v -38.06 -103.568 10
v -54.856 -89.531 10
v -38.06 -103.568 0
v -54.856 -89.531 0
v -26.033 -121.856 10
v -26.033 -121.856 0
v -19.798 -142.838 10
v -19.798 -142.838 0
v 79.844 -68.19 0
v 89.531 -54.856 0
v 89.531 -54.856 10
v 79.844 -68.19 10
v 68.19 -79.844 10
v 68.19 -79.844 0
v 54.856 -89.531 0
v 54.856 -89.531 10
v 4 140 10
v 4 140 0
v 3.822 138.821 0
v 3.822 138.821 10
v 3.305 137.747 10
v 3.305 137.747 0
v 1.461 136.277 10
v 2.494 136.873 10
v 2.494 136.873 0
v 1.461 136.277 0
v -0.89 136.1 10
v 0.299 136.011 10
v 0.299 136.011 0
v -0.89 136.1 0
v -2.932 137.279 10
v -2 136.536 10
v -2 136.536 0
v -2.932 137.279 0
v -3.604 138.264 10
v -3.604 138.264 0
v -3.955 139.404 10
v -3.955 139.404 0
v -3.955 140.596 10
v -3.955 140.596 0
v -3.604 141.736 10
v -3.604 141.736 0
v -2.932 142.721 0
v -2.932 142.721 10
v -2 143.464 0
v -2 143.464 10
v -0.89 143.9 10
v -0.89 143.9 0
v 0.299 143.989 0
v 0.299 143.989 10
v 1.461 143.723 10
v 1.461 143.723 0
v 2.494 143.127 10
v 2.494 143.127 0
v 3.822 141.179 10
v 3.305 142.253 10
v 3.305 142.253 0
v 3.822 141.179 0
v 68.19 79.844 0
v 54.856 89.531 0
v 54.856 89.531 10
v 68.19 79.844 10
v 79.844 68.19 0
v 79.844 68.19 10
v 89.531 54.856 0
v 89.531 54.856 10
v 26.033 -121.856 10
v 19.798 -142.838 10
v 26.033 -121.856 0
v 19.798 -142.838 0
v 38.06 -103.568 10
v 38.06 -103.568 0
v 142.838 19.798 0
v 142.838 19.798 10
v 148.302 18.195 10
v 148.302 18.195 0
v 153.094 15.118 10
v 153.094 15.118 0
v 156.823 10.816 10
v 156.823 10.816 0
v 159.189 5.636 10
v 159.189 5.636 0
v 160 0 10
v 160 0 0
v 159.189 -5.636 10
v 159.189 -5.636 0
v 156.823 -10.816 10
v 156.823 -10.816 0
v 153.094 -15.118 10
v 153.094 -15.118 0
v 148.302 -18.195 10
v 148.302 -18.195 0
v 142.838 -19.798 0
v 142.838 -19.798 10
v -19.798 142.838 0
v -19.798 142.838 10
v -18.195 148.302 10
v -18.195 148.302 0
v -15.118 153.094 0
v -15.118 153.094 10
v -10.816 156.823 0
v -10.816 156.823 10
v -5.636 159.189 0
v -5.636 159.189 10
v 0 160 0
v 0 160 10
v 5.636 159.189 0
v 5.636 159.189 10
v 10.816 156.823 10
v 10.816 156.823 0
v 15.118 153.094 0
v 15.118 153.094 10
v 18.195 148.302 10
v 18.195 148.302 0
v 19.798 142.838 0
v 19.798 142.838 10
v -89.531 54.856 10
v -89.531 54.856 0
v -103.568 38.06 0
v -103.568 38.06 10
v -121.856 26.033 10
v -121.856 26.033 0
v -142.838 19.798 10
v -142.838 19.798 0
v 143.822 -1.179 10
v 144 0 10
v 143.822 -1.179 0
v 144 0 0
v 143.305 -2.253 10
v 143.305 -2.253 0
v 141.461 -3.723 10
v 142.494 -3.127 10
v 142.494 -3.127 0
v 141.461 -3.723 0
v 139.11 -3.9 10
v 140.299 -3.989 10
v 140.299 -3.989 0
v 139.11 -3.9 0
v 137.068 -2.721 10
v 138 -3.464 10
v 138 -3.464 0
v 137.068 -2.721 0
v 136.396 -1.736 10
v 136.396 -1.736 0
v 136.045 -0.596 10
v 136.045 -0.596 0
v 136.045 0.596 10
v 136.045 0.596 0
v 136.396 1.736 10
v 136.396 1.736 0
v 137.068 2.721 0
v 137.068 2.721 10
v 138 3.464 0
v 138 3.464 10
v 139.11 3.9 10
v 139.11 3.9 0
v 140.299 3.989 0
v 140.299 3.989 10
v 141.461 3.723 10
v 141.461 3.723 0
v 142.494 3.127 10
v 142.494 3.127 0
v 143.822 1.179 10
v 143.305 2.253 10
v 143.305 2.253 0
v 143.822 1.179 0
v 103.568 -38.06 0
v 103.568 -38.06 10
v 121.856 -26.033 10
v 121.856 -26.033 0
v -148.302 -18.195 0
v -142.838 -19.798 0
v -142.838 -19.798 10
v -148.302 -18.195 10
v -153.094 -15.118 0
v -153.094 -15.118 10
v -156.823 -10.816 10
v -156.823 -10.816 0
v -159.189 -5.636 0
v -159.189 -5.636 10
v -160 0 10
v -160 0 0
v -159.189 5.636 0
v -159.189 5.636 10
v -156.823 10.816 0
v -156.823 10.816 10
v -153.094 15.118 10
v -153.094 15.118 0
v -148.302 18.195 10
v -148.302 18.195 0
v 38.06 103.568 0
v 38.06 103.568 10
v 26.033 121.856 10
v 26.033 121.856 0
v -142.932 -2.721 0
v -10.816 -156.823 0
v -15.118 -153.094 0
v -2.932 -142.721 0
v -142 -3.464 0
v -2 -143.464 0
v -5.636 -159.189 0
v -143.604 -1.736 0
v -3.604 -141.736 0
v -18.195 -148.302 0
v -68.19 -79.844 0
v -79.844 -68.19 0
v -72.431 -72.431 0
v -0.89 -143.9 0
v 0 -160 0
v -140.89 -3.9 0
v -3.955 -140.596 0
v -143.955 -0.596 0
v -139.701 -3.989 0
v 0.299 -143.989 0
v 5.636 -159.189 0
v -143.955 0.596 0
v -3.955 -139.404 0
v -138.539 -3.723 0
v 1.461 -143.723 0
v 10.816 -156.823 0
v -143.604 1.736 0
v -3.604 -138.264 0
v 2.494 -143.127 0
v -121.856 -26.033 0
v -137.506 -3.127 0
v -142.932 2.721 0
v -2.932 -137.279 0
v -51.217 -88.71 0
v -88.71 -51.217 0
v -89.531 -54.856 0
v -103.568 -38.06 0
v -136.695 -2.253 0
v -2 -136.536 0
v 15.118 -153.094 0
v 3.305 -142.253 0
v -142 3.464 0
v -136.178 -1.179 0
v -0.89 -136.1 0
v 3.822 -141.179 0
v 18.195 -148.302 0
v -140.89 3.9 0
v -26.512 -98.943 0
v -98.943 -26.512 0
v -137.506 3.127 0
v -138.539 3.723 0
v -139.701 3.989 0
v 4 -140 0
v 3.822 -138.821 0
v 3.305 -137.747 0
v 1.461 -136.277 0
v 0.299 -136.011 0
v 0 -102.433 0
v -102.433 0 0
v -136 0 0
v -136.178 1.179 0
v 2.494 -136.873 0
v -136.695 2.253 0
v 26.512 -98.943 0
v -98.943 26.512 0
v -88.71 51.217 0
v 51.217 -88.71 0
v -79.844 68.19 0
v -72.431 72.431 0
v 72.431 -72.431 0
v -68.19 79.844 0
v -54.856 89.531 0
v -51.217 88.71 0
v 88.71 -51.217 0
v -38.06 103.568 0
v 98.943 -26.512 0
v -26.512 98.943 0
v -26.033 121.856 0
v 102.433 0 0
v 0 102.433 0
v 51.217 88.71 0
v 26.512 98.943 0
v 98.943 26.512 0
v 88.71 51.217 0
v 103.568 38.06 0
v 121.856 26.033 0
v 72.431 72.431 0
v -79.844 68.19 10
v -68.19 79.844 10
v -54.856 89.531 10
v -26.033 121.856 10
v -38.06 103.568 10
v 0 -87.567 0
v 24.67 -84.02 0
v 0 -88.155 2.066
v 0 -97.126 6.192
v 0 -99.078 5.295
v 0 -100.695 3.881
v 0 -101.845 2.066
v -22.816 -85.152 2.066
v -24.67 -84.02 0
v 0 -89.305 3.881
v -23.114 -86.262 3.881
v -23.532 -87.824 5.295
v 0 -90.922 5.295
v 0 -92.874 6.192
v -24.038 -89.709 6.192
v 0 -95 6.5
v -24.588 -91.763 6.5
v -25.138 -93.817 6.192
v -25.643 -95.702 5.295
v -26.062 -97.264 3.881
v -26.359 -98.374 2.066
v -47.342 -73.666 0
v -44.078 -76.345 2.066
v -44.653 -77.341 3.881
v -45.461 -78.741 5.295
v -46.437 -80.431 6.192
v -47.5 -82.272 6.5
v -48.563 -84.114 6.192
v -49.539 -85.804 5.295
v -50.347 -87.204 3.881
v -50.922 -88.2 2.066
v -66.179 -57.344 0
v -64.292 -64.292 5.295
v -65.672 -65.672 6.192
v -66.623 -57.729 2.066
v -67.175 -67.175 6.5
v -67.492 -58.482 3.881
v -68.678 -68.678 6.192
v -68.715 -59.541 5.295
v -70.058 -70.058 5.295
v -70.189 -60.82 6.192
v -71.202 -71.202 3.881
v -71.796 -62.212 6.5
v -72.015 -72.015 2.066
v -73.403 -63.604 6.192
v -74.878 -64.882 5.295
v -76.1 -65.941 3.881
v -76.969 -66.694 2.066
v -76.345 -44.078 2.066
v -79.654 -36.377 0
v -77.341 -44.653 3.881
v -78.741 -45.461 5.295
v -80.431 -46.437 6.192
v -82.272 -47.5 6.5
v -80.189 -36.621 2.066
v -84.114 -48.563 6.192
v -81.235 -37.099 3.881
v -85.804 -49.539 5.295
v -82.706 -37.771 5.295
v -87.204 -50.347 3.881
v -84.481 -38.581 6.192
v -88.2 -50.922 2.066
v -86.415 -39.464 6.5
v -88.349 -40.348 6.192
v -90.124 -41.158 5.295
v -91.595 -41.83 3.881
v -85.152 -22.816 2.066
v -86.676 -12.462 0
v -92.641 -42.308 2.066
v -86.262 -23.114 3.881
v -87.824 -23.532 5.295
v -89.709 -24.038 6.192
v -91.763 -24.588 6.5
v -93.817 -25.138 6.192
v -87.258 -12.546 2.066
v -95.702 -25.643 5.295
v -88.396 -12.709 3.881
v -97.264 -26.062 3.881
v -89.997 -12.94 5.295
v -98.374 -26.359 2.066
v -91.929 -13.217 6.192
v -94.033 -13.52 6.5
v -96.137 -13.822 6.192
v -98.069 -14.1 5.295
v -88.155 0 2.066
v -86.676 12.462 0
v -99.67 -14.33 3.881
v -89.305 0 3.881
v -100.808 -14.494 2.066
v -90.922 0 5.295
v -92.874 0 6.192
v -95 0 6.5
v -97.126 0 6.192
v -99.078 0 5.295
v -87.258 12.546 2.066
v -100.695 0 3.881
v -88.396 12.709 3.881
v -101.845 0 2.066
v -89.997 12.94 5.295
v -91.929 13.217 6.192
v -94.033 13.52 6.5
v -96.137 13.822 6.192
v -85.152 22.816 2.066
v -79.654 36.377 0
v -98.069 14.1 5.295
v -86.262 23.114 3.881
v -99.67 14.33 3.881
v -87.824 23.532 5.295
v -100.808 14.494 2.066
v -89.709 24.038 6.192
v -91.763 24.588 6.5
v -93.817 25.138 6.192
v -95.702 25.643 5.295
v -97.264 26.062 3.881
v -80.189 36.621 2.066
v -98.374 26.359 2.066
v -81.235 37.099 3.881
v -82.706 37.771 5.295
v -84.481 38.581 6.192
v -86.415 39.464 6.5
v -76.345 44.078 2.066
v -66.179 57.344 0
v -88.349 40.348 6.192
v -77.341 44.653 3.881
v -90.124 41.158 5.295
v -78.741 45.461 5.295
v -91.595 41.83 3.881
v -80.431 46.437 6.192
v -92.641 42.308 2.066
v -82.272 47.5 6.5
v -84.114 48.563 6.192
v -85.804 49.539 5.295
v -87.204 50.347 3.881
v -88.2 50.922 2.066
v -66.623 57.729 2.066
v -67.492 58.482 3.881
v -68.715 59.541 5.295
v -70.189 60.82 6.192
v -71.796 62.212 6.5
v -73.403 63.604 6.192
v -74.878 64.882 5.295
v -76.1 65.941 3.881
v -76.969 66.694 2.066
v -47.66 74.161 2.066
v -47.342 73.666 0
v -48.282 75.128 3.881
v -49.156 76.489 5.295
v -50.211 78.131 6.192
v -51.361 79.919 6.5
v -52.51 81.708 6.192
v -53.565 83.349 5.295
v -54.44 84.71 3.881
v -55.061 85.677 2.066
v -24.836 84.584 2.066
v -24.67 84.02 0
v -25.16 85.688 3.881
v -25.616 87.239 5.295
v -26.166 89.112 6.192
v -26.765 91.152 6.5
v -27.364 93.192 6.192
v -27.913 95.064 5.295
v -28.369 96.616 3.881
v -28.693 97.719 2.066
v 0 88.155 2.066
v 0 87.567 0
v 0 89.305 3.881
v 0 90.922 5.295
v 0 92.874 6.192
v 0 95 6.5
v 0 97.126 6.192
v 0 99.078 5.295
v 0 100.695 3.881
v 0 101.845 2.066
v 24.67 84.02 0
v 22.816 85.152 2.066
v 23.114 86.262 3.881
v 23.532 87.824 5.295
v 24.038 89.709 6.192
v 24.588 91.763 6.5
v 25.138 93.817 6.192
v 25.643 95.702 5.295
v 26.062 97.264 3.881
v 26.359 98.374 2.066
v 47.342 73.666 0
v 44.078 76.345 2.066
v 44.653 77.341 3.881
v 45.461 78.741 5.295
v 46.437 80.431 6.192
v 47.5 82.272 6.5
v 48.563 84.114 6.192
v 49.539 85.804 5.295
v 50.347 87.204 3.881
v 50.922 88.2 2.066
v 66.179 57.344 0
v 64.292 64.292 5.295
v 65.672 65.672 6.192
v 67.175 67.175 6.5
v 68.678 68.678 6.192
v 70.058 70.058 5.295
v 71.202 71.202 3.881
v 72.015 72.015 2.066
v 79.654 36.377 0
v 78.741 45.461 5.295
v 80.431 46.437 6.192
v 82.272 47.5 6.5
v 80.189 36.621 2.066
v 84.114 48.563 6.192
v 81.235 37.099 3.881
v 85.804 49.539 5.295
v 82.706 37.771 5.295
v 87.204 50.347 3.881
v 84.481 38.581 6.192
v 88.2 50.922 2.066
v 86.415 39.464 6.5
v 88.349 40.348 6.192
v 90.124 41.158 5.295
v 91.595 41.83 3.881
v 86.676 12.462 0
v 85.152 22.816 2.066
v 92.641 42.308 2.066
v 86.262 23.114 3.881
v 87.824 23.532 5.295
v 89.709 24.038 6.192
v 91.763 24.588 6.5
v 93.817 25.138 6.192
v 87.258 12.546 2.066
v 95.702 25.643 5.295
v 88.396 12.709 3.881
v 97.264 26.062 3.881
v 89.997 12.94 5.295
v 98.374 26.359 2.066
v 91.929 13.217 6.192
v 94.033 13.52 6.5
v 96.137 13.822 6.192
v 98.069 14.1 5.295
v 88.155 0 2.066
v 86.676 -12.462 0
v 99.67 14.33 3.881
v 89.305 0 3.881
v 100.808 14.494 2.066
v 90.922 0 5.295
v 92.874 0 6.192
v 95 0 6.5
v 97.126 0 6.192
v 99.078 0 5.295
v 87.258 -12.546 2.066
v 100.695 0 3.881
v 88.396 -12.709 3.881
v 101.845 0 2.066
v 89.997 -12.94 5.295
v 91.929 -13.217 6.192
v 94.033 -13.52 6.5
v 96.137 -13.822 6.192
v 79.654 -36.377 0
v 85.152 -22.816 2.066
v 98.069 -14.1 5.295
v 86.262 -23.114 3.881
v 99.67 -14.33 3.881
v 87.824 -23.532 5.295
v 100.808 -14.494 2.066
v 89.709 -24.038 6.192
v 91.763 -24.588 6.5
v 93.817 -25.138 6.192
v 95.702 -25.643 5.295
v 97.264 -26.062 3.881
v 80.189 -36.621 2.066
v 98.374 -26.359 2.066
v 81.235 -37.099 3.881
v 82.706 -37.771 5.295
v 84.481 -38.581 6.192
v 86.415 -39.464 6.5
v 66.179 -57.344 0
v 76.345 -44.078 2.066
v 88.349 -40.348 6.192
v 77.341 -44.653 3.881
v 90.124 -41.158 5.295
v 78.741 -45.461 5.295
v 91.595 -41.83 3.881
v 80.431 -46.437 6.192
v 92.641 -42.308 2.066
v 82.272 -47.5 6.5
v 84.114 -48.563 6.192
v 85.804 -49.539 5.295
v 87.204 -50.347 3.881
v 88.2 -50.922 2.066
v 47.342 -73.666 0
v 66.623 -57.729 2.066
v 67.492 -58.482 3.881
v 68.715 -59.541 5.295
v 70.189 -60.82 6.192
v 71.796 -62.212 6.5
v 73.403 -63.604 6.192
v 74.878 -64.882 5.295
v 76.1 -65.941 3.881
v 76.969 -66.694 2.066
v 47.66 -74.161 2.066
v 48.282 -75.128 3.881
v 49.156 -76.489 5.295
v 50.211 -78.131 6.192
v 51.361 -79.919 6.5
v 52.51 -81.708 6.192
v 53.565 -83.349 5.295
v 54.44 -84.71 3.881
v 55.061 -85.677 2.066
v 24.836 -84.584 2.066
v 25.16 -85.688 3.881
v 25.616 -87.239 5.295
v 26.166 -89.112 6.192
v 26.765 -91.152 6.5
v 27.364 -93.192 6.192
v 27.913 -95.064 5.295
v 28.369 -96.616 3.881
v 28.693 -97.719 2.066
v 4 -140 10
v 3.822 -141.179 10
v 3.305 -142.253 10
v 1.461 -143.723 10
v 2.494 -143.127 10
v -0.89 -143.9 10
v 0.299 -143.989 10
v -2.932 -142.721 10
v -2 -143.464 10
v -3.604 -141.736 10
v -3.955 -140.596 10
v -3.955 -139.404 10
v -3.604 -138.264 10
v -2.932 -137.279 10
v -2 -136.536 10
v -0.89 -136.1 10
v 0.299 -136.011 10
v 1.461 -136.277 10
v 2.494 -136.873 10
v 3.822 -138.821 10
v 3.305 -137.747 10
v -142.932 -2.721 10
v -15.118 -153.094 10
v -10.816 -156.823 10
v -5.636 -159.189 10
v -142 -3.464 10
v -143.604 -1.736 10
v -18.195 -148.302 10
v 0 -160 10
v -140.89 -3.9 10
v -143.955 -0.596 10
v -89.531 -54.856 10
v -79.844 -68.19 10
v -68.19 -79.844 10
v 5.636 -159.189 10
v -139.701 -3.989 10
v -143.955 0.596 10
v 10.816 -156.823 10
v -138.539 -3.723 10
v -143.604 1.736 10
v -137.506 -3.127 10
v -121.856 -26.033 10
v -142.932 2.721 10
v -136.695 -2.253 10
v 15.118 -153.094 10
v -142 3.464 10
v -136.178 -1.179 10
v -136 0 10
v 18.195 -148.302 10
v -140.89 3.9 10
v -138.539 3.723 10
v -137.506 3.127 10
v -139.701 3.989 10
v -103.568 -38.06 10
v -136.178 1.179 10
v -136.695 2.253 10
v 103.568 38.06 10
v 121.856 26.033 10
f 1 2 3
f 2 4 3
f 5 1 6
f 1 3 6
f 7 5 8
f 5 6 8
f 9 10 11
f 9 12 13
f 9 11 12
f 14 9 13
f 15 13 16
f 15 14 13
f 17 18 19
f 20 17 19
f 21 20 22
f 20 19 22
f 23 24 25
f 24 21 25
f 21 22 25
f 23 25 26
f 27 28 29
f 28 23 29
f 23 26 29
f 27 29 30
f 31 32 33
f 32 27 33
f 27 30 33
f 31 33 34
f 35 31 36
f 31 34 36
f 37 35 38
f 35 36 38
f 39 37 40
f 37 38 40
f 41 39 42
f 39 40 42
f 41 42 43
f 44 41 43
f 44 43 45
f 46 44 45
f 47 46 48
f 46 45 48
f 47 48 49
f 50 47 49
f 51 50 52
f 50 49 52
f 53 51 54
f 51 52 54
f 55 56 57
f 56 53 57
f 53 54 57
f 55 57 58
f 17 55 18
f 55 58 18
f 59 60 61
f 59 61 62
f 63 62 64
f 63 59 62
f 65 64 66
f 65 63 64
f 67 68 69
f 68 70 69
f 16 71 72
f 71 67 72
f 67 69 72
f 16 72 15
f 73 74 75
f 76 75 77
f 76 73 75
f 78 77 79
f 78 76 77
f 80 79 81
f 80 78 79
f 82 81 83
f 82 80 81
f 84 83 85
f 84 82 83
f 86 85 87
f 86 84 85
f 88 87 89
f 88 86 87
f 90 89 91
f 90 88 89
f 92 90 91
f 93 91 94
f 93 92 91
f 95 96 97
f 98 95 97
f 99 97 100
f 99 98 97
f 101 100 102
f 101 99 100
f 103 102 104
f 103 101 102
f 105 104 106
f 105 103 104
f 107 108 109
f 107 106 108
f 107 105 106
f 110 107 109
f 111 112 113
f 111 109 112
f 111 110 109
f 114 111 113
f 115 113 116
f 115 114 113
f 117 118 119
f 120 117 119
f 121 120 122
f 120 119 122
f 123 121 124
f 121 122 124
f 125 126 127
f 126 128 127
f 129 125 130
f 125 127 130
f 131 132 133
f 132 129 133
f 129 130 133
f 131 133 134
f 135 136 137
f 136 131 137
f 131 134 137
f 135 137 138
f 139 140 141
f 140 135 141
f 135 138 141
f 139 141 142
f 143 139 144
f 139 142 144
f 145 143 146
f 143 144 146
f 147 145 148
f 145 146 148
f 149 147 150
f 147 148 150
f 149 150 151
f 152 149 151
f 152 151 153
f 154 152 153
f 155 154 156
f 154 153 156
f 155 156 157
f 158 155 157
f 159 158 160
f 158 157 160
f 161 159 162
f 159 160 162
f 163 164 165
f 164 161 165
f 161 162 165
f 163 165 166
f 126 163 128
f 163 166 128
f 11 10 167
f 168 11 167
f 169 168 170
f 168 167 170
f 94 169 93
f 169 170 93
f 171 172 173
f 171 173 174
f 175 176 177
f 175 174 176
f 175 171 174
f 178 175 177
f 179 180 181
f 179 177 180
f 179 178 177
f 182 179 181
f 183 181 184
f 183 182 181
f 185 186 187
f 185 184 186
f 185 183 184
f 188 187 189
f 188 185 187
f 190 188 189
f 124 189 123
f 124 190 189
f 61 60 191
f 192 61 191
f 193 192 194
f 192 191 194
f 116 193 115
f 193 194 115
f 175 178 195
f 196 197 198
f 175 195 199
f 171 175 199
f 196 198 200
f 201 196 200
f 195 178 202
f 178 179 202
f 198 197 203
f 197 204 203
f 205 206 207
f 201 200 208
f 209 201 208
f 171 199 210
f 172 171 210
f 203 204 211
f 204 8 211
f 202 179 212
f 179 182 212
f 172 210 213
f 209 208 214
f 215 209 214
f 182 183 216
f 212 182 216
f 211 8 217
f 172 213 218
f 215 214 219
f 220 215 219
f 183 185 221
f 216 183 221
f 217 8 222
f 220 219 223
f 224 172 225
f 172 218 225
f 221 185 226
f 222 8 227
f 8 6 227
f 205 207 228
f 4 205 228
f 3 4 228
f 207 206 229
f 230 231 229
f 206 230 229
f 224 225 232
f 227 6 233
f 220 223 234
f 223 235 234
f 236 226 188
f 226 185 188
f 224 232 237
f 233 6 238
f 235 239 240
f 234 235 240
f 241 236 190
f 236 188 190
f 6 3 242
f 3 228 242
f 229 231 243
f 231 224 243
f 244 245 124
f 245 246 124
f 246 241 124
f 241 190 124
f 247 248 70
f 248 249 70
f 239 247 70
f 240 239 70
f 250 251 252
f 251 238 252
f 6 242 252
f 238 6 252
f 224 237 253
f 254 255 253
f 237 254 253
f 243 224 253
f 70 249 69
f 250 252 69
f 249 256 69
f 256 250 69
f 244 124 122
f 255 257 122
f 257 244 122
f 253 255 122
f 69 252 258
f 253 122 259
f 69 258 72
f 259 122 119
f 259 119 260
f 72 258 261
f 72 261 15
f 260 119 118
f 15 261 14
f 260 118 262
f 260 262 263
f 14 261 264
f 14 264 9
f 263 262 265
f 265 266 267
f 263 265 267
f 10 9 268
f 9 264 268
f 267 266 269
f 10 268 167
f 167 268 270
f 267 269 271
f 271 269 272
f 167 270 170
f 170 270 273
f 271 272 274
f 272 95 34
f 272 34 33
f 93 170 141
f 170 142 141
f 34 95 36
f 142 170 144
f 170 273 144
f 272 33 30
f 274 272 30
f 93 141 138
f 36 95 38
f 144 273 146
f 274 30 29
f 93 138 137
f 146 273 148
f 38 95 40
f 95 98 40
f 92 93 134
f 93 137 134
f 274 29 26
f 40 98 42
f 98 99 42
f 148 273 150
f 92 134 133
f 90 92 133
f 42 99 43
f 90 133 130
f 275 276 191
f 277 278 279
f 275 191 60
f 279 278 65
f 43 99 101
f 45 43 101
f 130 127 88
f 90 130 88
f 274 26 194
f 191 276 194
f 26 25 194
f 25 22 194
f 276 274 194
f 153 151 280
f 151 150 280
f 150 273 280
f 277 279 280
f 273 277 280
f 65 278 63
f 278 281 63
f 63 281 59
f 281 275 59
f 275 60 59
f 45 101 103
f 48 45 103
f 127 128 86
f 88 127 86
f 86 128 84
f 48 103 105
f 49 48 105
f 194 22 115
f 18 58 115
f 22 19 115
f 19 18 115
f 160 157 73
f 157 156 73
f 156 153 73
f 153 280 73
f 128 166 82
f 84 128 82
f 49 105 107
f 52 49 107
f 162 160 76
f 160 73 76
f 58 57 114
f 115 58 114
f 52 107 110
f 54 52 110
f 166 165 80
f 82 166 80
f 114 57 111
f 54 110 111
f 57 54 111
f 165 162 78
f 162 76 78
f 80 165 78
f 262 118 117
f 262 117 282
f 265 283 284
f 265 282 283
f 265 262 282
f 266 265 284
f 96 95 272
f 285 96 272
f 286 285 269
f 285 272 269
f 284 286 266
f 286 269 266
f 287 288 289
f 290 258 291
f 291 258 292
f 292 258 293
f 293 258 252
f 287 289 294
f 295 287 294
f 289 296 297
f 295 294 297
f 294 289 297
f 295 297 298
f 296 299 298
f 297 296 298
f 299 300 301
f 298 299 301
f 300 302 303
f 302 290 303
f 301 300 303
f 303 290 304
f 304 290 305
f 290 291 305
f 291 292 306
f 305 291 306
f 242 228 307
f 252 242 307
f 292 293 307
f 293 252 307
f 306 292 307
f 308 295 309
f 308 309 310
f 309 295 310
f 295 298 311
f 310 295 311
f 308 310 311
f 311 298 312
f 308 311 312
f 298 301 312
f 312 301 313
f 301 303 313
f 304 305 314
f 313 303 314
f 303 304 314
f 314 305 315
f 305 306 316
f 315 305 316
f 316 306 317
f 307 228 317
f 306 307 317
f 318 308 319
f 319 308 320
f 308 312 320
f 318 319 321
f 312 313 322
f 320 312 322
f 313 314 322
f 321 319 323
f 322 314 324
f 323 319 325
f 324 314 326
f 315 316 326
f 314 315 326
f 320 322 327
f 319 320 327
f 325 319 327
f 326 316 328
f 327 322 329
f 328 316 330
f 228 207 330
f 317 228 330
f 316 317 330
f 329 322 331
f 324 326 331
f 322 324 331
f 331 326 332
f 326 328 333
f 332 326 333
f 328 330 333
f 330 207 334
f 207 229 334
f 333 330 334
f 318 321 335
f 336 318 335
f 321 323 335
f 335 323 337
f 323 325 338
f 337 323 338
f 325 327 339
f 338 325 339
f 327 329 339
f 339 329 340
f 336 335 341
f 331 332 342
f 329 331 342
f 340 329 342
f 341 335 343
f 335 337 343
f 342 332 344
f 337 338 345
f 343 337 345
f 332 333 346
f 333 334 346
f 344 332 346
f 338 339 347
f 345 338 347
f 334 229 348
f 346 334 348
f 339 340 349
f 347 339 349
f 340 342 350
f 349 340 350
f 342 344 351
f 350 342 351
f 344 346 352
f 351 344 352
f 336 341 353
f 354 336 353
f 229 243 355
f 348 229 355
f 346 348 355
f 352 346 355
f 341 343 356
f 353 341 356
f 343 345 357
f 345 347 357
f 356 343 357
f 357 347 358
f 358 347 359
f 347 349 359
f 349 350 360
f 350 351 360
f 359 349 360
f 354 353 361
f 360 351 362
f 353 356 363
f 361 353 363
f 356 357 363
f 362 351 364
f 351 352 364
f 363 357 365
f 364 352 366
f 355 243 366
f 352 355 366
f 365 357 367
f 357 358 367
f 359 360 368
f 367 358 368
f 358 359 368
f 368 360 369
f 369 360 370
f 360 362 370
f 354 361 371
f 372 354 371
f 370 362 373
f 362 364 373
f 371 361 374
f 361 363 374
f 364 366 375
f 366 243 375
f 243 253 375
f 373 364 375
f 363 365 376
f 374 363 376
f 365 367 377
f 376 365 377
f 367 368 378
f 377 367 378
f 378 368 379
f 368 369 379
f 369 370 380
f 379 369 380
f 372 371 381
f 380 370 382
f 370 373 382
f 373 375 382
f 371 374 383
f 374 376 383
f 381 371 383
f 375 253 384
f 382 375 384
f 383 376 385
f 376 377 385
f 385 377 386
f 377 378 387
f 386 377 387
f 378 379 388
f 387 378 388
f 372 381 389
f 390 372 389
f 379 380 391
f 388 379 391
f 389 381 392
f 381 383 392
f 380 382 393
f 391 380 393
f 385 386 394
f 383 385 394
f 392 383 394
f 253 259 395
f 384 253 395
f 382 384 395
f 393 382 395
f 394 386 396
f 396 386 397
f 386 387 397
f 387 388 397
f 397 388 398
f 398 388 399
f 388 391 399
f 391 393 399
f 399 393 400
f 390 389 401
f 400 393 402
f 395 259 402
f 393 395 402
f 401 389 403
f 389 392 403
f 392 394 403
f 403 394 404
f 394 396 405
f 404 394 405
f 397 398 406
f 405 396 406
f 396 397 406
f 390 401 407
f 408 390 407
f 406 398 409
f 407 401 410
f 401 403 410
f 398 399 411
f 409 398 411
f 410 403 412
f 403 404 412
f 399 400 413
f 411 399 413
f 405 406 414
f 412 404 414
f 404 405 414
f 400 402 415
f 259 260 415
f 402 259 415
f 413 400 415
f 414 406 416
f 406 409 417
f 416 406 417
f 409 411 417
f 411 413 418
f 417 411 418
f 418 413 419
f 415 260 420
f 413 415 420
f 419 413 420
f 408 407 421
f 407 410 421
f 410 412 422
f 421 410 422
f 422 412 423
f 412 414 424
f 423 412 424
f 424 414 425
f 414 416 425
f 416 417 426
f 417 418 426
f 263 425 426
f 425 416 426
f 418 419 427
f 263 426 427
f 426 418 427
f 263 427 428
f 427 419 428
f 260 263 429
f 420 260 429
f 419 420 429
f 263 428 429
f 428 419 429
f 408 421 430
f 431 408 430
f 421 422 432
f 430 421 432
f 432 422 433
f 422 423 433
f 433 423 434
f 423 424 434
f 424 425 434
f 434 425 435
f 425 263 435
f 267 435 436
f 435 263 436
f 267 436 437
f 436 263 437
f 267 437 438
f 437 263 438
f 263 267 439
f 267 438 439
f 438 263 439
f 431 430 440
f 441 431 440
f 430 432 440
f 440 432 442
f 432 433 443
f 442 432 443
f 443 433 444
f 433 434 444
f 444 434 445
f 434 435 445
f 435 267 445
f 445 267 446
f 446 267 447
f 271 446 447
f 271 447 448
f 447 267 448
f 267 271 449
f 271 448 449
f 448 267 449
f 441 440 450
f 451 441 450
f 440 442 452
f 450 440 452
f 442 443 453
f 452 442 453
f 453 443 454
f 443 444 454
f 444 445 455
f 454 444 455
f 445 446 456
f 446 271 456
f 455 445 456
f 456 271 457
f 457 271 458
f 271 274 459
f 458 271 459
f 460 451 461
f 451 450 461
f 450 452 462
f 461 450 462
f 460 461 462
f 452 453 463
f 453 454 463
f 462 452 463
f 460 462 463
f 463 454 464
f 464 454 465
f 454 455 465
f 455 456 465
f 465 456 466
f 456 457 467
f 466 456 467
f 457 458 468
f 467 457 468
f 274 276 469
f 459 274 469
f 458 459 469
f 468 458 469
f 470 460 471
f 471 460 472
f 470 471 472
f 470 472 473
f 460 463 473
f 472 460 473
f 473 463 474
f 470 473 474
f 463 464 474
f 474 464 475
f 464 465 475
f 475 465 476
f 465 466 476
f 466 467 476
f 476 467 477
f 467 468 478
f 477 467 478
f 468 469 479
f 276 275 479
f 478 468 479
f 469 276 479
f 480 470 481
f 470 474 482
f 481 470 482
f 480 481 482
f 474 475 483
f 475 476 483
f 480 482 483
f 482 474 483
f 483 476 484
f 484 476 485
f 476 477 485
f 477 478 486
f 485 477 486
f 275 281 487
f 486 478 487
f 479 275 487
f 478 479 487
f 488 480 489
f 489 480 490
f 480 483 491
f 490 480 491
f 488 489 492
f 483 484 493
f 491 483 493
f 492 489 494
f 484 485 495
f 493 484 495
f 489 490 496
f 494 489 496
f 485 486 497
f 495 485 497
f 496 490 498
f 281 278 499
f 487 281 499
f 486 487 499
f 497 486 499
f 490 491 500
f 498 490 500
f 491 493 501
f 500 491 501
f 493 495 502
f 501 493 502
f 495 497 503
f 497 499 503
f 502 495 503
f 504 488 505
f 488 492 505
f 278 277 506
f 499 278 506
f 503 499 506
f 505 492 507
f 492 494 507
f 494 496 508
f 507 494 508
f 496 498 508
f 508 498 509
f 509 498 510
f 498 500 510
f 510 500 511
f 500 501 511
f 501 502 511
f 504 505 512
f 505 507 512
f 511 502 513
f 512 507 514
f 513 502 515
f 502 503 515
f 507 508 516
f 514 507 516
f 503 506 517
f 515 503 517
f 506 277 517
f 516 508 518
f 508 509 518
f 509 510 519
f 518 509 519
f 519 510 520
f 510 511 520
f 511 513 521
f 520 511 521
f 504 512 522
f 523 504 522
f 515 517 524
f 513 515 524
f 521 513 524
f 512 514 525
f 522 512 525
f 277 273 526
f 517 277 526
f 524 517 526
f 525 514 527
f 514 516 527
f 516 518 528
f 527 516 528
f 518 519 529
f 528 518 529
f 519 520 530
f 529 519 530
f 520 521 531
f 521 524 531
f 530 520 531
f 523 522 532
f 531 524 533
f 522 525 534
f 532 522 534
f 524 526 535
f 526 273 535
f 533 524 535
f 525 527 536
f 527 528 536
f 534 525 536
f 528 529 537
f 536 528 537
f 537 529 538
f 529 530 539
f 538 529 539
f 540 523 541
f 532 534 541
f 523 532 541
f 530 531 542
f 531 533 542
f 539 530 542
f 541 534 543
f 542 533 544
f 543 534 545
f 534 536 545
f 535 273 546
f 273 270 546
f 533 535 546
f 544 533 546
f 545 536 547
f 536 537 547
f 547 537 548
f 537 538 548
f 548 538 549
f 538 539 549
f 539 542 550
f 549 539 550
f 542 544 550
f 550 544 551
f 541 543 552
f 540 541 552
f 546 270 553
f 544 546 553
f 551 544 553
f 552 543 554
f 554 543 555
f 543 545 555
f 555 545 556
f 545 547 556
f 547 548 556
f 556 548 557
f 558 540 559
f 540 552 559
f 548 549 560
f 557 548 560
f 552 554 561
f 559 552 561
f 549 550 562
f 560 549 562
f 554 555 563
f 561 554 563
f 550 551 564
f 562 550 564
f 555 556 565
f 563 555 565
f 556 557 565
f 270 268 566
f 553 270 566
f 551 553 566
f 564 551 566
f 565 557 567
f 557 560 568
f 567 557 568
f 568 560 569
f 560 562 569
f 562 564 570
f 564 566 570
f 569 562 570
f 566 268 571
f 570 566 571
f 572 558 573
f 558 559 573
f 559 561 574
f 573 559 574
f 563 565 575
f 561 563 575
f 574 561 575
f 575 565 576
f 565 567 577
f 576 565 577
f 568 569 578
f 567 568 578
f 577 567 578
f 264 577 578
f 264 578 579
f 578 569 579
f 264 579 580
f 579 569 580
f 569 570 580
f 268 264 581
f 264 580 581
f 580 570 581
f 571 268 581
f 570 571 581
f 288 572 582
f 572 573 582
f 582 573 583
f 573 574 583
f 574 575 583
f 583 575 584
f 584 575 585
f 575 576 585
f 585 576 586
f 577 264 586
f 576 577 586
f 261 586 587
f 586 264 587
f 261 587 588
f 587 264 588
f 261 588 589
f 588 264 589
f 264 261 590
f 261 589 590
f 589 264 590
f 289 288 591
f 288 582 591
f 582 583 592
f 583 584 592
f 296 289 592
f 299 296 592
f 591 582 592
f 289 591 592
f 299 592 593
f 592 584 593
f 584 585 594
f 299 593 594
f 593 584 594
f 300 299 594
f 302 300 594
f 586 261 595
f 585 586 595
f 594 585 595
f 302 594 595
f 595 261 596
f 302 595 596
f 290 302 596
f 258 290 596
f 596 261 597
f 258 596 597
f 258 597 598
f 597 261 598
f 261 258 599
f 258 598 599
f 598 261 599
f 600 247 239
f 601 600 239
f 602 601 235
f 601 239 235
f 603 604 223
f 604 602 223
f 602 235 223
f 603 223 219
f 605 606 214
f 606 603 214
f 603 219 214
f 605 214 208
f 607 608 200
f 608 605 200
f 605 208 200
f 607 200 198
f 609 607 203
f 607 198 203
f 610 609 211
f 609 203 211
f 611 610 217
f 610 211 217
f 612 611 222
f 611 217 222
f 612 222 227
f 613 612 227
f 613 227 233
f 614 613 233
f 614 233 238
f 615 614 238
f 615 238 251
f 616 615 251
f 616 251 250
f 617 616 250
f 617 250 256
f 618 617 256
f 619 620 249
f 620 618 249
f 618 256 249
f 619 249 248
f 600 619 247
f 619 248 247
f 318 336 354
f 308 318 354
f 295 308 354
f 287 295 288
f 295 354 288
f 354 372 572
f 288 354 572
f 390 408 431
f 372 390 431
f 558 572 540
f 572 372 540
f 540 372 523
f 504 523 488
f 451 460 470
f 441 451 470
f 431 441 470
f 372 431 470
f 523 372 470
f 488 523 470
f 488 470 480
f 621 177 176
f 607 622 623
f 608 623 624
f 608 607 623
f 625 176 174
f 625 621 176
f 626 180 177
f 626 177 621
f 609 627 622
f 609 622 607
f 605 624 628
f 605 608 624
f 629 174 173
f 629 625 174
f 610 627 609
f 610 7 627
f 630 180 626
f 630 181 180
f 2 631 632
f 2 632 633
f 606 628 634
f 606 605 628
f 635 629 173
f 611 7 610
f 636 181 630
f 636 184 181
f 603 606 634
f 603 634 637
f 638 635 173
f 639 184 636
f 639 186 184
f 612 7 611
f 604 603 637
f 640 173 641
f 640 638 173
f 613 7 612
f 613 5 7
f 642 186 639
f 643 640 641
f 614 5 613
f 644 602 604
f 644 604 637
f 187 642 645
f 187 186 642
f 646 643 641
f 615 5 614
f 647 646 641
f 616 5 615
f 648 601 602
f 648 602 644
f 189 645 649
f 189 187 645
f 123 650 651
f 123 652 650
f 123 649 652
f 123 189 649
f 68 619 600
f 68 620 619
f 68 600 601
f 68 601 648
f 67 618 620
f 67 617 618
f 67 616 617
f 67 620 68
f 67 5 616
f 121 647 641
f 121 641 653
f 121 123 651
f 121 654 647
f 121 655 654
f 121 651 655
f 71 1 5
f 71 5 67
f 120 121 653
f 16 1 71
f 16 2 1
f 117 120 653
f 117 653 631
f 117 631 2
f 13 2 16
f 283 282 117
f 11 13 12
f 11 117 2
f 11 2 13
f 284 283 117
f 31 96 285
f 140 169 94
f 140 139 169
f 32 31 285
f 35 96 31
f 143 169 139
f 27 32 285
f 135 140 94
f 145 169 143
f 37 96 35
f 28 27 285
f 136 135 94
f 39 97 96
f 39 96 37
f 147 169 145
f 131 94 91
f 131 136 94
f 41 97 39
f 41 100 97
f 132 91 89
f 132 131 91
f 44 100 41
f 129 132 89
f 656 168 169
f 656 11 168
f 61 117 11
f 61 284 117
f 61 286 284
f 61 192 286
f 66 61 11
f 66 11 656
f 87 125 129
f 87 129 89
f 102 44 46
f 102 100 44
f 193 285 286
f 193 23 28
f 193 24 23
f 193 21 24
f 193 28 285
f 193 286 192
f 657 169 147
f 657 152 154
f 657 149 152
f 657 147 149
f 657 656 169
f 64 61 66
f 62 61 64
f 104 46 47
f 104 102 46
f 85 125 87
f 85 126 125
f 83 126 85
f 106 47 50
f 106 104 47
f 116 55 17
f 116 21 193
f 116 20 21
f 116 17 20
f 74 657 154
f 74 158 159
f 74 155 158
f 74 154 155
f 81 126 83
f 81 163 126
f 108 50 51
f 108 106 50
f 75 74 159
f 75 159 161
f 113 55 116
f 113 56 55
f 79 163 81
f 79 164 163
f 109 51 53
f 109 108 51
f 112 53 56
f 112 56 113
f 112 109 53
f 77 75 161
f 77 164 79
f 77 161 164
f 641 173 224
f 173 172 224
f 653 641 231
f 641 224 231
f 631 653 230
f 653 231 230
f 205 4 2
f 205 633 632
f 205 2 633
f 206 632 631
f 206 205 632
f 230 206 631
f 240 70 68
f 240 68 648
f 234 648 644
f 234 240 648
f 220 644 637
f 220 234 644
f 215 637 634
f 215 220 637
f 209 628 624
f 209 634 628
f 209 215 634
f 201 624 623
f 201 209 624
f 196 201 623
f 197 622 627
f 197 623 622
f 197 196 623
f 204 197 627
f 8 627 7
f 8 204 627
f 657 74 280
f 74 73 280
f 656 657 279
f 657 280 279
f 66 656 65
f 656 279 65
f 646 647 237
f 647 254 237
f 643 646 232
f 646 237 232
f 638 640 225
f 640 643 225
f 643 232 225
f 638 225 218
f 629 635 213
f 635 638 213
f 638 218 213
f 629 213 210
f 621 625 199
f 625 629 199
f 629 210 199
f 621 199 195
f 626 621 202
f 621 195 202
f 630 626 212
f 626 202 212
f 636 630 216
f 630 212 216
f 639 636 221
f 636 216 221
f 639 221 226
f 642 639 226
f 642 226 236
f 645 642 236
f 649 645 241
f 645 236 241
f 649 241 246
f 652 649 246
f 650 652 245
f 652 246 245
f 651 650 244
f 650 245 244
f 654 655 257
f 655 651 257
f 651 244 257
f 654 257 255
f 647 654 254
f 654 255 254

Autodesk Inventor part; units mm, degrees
ref_plane "YZ Plane" through (0, 0, 0) normal (1, 0, 0) x (0, 1, 0)
ref_plane "XZ Plane" through (0, 0, 0) normal (0, 1, 0) x (-1, 0, 0)
ref_plane "XY Plane" through (0, 0, 0) normal (0, 0, 1) x (1, 0, 0)
sketch "Sketch1" plane through (0, 0, 0) normal (0, 0, 1) x (1, 0, 0)
  circle A0 centre (0, 0) radius 105
  circle A1 centre (140, 0) radius 4
  circle A2 centre (140, 0) radius 20
  arc A3 (89.5312, 54.8558) -> (142.8383, 19.7976) centre (153.4821, 94.0385) ccw
  arc A4 (142.8383, -19.7976) -> (89.5312, -54.8558) centre (153.4821, -94.0385) ccw
  circle A5 centre (0, 140) radius 4
  circle A6 centre (0, 140) radius 20
  arc A7 (19.7976, 142.8383) -> (54.8558, 89.5312) centre (94.0385, 153.4821) ccw
  arc A8 (-54.8558, 89.5312) -> (-19.7976, 142.8383) centre (-94.0385, 153.4821) ccw
  circle A9 centre (-140, 0) radius 4
  circle A10 centre (-140, 0) radius 20
  arc A11 (-142.8383, 19.7976) -> (-89.5312, 54.8558) centre (-153.4821, 94.0385) ccw
  arc A12 (-89.5312, -54.8558) -> (-142.8383, -19.7976) centre (-153.4821, -94.0385) ccw
  circle A13 centre (0, -140) radius 4
  circle A14 centre (0, -140) radius 20
  arc A15 (-19.7976, -142.8383) -> (-54.8558, -89.5312) centre (-94.0385, -153.4821) ccw
  arc A16 (54.8558, -89.5313) -> (19.7976, -142.8383) centre (94.0385, -153.4821) ccw
  point P0 (-54.8558, 89.5312)
  point P1 (-89.5312, 54.8558)
  point P2 (-54.8558, -89.5312)
  point P3 (54.8558, -89.5312)
  dimension "d0" = 210
  dimension "d1" = 8
  dimension "d2" = 40
  dimension "d3" = 140
  dimension "d4" = 75
  dimension "d7" = 360
extrude "Extrusion1" add sketch "Sketch1" along normal blind 10
sketch "Sketch2" plane through (0, 0, 0) normal (1, 0, 0) x (0, 1, 0)
  line L0 (-89.5312, 10) -> (-142.8383, 10) projected
  line L1 (-142.8383, 10) -> (-142.8383, 10) projected
  line L2 (-142.8383, 10) -> (-89.5312, 10) projected
  line L3 (-89.5312, 10) -> (-54.8558, 10) projected
  line L4 (-54.8558, 10) -> (-19.7976, 10) projected
  line L5 (-19.7976, 10) -> (19.7976, 10) projected
  line L6 (19.7976, 10) -> (54.8558, 10) projected
  line L7 (54.8558, 10) -> (89.5312, 10) projected
  line L8 (89.5312, 10) -> (142.8383, 10) projected
  line L9 (142.8383, 10) -> (142.8383, 10) projected
  line L10 (142.8383, 10) -> (89.5312, 10) projected
  line L11 (89.5312, 10) -> (54.8558, 10) projected
  line L12 (54.8558, 10) -> (19.7976, 10) projected
  line L13 (19.7976, 10) -> (-19.7976, 10) projected
  line L14 (-19.7976, 10) -> (-54.8558, 10) projected
  line L15 (-54.8558, 10) -> (-89.5312, 10) projected
  line L16 (-4, 10) -> (4, 10) projected
  line L17 (136, 10) -> (144, 10) projected
  line L18 (-4, 10) -> (4, 10) projected
  line L19 (-144, 10) -> (-136, 10) projected
  line L20 (-89.5312, 0) -> (-142.8383, 0) projected
  line L21 (-54.8558, 0) -> (-89.5312, 0) projected
  line L22 (-19.7976, 0) -> (-54.8558, 0) projected
  line L23 (19.7976, 0) -> (-19.7976, 0) projected
  line L24 (54.8558, 0) -> (19.7976, 0) projected
  line L25 (89.5312, 0) -> (54.8558, 0) projected
  line L26 (142.8383, 0) -> (89.5312, 0) projected
  line L27 (142.8383, 0) -> (142.8383, 0) projected
  line L28 (89.5312, 0) -> (142.8383, 0) projected
  line L29 (54.8558, 0) -> (89.5312, 0) projected
  line L30 (19.7976, 0) -> (54.8558, 0) projected
  line L31 (-19.7976, 0) -> (19.7976, 0) projected
  line L32 (-54.8558, 0) -> (-19.7976, 0) projected
  line L33 (-89.5312, 0) -> (-54.8558, 0) projected
  line L34 (-142.8383, 0) -> (-89.5312, 0) projected
  line L35 (-142.8383, 0) -> (-142.8383, 0) projected
  line L36 (-4, 0) -> (4, 0) projected
  line L37 (136, 0) -> (144, 0) projected
  line L38 (-4, 0) -> (4, 0) projected
  line L39 (-144, 0) -> (-136, 0) projected
  circle A0 centre (-95, -1) radius 7.5
  line L40 (0, 0) -> (0, 10)
  dimension "d11" = 15
  dimension "d12" = 1
  dimension "d13" = 95
revolve "Revolution1" cut sketch "Sketch2" angle 360 about axis through (0, 0, 0) along (0, 0, 1)
properties part number "onderkant base" material "Aluminum 6061"
